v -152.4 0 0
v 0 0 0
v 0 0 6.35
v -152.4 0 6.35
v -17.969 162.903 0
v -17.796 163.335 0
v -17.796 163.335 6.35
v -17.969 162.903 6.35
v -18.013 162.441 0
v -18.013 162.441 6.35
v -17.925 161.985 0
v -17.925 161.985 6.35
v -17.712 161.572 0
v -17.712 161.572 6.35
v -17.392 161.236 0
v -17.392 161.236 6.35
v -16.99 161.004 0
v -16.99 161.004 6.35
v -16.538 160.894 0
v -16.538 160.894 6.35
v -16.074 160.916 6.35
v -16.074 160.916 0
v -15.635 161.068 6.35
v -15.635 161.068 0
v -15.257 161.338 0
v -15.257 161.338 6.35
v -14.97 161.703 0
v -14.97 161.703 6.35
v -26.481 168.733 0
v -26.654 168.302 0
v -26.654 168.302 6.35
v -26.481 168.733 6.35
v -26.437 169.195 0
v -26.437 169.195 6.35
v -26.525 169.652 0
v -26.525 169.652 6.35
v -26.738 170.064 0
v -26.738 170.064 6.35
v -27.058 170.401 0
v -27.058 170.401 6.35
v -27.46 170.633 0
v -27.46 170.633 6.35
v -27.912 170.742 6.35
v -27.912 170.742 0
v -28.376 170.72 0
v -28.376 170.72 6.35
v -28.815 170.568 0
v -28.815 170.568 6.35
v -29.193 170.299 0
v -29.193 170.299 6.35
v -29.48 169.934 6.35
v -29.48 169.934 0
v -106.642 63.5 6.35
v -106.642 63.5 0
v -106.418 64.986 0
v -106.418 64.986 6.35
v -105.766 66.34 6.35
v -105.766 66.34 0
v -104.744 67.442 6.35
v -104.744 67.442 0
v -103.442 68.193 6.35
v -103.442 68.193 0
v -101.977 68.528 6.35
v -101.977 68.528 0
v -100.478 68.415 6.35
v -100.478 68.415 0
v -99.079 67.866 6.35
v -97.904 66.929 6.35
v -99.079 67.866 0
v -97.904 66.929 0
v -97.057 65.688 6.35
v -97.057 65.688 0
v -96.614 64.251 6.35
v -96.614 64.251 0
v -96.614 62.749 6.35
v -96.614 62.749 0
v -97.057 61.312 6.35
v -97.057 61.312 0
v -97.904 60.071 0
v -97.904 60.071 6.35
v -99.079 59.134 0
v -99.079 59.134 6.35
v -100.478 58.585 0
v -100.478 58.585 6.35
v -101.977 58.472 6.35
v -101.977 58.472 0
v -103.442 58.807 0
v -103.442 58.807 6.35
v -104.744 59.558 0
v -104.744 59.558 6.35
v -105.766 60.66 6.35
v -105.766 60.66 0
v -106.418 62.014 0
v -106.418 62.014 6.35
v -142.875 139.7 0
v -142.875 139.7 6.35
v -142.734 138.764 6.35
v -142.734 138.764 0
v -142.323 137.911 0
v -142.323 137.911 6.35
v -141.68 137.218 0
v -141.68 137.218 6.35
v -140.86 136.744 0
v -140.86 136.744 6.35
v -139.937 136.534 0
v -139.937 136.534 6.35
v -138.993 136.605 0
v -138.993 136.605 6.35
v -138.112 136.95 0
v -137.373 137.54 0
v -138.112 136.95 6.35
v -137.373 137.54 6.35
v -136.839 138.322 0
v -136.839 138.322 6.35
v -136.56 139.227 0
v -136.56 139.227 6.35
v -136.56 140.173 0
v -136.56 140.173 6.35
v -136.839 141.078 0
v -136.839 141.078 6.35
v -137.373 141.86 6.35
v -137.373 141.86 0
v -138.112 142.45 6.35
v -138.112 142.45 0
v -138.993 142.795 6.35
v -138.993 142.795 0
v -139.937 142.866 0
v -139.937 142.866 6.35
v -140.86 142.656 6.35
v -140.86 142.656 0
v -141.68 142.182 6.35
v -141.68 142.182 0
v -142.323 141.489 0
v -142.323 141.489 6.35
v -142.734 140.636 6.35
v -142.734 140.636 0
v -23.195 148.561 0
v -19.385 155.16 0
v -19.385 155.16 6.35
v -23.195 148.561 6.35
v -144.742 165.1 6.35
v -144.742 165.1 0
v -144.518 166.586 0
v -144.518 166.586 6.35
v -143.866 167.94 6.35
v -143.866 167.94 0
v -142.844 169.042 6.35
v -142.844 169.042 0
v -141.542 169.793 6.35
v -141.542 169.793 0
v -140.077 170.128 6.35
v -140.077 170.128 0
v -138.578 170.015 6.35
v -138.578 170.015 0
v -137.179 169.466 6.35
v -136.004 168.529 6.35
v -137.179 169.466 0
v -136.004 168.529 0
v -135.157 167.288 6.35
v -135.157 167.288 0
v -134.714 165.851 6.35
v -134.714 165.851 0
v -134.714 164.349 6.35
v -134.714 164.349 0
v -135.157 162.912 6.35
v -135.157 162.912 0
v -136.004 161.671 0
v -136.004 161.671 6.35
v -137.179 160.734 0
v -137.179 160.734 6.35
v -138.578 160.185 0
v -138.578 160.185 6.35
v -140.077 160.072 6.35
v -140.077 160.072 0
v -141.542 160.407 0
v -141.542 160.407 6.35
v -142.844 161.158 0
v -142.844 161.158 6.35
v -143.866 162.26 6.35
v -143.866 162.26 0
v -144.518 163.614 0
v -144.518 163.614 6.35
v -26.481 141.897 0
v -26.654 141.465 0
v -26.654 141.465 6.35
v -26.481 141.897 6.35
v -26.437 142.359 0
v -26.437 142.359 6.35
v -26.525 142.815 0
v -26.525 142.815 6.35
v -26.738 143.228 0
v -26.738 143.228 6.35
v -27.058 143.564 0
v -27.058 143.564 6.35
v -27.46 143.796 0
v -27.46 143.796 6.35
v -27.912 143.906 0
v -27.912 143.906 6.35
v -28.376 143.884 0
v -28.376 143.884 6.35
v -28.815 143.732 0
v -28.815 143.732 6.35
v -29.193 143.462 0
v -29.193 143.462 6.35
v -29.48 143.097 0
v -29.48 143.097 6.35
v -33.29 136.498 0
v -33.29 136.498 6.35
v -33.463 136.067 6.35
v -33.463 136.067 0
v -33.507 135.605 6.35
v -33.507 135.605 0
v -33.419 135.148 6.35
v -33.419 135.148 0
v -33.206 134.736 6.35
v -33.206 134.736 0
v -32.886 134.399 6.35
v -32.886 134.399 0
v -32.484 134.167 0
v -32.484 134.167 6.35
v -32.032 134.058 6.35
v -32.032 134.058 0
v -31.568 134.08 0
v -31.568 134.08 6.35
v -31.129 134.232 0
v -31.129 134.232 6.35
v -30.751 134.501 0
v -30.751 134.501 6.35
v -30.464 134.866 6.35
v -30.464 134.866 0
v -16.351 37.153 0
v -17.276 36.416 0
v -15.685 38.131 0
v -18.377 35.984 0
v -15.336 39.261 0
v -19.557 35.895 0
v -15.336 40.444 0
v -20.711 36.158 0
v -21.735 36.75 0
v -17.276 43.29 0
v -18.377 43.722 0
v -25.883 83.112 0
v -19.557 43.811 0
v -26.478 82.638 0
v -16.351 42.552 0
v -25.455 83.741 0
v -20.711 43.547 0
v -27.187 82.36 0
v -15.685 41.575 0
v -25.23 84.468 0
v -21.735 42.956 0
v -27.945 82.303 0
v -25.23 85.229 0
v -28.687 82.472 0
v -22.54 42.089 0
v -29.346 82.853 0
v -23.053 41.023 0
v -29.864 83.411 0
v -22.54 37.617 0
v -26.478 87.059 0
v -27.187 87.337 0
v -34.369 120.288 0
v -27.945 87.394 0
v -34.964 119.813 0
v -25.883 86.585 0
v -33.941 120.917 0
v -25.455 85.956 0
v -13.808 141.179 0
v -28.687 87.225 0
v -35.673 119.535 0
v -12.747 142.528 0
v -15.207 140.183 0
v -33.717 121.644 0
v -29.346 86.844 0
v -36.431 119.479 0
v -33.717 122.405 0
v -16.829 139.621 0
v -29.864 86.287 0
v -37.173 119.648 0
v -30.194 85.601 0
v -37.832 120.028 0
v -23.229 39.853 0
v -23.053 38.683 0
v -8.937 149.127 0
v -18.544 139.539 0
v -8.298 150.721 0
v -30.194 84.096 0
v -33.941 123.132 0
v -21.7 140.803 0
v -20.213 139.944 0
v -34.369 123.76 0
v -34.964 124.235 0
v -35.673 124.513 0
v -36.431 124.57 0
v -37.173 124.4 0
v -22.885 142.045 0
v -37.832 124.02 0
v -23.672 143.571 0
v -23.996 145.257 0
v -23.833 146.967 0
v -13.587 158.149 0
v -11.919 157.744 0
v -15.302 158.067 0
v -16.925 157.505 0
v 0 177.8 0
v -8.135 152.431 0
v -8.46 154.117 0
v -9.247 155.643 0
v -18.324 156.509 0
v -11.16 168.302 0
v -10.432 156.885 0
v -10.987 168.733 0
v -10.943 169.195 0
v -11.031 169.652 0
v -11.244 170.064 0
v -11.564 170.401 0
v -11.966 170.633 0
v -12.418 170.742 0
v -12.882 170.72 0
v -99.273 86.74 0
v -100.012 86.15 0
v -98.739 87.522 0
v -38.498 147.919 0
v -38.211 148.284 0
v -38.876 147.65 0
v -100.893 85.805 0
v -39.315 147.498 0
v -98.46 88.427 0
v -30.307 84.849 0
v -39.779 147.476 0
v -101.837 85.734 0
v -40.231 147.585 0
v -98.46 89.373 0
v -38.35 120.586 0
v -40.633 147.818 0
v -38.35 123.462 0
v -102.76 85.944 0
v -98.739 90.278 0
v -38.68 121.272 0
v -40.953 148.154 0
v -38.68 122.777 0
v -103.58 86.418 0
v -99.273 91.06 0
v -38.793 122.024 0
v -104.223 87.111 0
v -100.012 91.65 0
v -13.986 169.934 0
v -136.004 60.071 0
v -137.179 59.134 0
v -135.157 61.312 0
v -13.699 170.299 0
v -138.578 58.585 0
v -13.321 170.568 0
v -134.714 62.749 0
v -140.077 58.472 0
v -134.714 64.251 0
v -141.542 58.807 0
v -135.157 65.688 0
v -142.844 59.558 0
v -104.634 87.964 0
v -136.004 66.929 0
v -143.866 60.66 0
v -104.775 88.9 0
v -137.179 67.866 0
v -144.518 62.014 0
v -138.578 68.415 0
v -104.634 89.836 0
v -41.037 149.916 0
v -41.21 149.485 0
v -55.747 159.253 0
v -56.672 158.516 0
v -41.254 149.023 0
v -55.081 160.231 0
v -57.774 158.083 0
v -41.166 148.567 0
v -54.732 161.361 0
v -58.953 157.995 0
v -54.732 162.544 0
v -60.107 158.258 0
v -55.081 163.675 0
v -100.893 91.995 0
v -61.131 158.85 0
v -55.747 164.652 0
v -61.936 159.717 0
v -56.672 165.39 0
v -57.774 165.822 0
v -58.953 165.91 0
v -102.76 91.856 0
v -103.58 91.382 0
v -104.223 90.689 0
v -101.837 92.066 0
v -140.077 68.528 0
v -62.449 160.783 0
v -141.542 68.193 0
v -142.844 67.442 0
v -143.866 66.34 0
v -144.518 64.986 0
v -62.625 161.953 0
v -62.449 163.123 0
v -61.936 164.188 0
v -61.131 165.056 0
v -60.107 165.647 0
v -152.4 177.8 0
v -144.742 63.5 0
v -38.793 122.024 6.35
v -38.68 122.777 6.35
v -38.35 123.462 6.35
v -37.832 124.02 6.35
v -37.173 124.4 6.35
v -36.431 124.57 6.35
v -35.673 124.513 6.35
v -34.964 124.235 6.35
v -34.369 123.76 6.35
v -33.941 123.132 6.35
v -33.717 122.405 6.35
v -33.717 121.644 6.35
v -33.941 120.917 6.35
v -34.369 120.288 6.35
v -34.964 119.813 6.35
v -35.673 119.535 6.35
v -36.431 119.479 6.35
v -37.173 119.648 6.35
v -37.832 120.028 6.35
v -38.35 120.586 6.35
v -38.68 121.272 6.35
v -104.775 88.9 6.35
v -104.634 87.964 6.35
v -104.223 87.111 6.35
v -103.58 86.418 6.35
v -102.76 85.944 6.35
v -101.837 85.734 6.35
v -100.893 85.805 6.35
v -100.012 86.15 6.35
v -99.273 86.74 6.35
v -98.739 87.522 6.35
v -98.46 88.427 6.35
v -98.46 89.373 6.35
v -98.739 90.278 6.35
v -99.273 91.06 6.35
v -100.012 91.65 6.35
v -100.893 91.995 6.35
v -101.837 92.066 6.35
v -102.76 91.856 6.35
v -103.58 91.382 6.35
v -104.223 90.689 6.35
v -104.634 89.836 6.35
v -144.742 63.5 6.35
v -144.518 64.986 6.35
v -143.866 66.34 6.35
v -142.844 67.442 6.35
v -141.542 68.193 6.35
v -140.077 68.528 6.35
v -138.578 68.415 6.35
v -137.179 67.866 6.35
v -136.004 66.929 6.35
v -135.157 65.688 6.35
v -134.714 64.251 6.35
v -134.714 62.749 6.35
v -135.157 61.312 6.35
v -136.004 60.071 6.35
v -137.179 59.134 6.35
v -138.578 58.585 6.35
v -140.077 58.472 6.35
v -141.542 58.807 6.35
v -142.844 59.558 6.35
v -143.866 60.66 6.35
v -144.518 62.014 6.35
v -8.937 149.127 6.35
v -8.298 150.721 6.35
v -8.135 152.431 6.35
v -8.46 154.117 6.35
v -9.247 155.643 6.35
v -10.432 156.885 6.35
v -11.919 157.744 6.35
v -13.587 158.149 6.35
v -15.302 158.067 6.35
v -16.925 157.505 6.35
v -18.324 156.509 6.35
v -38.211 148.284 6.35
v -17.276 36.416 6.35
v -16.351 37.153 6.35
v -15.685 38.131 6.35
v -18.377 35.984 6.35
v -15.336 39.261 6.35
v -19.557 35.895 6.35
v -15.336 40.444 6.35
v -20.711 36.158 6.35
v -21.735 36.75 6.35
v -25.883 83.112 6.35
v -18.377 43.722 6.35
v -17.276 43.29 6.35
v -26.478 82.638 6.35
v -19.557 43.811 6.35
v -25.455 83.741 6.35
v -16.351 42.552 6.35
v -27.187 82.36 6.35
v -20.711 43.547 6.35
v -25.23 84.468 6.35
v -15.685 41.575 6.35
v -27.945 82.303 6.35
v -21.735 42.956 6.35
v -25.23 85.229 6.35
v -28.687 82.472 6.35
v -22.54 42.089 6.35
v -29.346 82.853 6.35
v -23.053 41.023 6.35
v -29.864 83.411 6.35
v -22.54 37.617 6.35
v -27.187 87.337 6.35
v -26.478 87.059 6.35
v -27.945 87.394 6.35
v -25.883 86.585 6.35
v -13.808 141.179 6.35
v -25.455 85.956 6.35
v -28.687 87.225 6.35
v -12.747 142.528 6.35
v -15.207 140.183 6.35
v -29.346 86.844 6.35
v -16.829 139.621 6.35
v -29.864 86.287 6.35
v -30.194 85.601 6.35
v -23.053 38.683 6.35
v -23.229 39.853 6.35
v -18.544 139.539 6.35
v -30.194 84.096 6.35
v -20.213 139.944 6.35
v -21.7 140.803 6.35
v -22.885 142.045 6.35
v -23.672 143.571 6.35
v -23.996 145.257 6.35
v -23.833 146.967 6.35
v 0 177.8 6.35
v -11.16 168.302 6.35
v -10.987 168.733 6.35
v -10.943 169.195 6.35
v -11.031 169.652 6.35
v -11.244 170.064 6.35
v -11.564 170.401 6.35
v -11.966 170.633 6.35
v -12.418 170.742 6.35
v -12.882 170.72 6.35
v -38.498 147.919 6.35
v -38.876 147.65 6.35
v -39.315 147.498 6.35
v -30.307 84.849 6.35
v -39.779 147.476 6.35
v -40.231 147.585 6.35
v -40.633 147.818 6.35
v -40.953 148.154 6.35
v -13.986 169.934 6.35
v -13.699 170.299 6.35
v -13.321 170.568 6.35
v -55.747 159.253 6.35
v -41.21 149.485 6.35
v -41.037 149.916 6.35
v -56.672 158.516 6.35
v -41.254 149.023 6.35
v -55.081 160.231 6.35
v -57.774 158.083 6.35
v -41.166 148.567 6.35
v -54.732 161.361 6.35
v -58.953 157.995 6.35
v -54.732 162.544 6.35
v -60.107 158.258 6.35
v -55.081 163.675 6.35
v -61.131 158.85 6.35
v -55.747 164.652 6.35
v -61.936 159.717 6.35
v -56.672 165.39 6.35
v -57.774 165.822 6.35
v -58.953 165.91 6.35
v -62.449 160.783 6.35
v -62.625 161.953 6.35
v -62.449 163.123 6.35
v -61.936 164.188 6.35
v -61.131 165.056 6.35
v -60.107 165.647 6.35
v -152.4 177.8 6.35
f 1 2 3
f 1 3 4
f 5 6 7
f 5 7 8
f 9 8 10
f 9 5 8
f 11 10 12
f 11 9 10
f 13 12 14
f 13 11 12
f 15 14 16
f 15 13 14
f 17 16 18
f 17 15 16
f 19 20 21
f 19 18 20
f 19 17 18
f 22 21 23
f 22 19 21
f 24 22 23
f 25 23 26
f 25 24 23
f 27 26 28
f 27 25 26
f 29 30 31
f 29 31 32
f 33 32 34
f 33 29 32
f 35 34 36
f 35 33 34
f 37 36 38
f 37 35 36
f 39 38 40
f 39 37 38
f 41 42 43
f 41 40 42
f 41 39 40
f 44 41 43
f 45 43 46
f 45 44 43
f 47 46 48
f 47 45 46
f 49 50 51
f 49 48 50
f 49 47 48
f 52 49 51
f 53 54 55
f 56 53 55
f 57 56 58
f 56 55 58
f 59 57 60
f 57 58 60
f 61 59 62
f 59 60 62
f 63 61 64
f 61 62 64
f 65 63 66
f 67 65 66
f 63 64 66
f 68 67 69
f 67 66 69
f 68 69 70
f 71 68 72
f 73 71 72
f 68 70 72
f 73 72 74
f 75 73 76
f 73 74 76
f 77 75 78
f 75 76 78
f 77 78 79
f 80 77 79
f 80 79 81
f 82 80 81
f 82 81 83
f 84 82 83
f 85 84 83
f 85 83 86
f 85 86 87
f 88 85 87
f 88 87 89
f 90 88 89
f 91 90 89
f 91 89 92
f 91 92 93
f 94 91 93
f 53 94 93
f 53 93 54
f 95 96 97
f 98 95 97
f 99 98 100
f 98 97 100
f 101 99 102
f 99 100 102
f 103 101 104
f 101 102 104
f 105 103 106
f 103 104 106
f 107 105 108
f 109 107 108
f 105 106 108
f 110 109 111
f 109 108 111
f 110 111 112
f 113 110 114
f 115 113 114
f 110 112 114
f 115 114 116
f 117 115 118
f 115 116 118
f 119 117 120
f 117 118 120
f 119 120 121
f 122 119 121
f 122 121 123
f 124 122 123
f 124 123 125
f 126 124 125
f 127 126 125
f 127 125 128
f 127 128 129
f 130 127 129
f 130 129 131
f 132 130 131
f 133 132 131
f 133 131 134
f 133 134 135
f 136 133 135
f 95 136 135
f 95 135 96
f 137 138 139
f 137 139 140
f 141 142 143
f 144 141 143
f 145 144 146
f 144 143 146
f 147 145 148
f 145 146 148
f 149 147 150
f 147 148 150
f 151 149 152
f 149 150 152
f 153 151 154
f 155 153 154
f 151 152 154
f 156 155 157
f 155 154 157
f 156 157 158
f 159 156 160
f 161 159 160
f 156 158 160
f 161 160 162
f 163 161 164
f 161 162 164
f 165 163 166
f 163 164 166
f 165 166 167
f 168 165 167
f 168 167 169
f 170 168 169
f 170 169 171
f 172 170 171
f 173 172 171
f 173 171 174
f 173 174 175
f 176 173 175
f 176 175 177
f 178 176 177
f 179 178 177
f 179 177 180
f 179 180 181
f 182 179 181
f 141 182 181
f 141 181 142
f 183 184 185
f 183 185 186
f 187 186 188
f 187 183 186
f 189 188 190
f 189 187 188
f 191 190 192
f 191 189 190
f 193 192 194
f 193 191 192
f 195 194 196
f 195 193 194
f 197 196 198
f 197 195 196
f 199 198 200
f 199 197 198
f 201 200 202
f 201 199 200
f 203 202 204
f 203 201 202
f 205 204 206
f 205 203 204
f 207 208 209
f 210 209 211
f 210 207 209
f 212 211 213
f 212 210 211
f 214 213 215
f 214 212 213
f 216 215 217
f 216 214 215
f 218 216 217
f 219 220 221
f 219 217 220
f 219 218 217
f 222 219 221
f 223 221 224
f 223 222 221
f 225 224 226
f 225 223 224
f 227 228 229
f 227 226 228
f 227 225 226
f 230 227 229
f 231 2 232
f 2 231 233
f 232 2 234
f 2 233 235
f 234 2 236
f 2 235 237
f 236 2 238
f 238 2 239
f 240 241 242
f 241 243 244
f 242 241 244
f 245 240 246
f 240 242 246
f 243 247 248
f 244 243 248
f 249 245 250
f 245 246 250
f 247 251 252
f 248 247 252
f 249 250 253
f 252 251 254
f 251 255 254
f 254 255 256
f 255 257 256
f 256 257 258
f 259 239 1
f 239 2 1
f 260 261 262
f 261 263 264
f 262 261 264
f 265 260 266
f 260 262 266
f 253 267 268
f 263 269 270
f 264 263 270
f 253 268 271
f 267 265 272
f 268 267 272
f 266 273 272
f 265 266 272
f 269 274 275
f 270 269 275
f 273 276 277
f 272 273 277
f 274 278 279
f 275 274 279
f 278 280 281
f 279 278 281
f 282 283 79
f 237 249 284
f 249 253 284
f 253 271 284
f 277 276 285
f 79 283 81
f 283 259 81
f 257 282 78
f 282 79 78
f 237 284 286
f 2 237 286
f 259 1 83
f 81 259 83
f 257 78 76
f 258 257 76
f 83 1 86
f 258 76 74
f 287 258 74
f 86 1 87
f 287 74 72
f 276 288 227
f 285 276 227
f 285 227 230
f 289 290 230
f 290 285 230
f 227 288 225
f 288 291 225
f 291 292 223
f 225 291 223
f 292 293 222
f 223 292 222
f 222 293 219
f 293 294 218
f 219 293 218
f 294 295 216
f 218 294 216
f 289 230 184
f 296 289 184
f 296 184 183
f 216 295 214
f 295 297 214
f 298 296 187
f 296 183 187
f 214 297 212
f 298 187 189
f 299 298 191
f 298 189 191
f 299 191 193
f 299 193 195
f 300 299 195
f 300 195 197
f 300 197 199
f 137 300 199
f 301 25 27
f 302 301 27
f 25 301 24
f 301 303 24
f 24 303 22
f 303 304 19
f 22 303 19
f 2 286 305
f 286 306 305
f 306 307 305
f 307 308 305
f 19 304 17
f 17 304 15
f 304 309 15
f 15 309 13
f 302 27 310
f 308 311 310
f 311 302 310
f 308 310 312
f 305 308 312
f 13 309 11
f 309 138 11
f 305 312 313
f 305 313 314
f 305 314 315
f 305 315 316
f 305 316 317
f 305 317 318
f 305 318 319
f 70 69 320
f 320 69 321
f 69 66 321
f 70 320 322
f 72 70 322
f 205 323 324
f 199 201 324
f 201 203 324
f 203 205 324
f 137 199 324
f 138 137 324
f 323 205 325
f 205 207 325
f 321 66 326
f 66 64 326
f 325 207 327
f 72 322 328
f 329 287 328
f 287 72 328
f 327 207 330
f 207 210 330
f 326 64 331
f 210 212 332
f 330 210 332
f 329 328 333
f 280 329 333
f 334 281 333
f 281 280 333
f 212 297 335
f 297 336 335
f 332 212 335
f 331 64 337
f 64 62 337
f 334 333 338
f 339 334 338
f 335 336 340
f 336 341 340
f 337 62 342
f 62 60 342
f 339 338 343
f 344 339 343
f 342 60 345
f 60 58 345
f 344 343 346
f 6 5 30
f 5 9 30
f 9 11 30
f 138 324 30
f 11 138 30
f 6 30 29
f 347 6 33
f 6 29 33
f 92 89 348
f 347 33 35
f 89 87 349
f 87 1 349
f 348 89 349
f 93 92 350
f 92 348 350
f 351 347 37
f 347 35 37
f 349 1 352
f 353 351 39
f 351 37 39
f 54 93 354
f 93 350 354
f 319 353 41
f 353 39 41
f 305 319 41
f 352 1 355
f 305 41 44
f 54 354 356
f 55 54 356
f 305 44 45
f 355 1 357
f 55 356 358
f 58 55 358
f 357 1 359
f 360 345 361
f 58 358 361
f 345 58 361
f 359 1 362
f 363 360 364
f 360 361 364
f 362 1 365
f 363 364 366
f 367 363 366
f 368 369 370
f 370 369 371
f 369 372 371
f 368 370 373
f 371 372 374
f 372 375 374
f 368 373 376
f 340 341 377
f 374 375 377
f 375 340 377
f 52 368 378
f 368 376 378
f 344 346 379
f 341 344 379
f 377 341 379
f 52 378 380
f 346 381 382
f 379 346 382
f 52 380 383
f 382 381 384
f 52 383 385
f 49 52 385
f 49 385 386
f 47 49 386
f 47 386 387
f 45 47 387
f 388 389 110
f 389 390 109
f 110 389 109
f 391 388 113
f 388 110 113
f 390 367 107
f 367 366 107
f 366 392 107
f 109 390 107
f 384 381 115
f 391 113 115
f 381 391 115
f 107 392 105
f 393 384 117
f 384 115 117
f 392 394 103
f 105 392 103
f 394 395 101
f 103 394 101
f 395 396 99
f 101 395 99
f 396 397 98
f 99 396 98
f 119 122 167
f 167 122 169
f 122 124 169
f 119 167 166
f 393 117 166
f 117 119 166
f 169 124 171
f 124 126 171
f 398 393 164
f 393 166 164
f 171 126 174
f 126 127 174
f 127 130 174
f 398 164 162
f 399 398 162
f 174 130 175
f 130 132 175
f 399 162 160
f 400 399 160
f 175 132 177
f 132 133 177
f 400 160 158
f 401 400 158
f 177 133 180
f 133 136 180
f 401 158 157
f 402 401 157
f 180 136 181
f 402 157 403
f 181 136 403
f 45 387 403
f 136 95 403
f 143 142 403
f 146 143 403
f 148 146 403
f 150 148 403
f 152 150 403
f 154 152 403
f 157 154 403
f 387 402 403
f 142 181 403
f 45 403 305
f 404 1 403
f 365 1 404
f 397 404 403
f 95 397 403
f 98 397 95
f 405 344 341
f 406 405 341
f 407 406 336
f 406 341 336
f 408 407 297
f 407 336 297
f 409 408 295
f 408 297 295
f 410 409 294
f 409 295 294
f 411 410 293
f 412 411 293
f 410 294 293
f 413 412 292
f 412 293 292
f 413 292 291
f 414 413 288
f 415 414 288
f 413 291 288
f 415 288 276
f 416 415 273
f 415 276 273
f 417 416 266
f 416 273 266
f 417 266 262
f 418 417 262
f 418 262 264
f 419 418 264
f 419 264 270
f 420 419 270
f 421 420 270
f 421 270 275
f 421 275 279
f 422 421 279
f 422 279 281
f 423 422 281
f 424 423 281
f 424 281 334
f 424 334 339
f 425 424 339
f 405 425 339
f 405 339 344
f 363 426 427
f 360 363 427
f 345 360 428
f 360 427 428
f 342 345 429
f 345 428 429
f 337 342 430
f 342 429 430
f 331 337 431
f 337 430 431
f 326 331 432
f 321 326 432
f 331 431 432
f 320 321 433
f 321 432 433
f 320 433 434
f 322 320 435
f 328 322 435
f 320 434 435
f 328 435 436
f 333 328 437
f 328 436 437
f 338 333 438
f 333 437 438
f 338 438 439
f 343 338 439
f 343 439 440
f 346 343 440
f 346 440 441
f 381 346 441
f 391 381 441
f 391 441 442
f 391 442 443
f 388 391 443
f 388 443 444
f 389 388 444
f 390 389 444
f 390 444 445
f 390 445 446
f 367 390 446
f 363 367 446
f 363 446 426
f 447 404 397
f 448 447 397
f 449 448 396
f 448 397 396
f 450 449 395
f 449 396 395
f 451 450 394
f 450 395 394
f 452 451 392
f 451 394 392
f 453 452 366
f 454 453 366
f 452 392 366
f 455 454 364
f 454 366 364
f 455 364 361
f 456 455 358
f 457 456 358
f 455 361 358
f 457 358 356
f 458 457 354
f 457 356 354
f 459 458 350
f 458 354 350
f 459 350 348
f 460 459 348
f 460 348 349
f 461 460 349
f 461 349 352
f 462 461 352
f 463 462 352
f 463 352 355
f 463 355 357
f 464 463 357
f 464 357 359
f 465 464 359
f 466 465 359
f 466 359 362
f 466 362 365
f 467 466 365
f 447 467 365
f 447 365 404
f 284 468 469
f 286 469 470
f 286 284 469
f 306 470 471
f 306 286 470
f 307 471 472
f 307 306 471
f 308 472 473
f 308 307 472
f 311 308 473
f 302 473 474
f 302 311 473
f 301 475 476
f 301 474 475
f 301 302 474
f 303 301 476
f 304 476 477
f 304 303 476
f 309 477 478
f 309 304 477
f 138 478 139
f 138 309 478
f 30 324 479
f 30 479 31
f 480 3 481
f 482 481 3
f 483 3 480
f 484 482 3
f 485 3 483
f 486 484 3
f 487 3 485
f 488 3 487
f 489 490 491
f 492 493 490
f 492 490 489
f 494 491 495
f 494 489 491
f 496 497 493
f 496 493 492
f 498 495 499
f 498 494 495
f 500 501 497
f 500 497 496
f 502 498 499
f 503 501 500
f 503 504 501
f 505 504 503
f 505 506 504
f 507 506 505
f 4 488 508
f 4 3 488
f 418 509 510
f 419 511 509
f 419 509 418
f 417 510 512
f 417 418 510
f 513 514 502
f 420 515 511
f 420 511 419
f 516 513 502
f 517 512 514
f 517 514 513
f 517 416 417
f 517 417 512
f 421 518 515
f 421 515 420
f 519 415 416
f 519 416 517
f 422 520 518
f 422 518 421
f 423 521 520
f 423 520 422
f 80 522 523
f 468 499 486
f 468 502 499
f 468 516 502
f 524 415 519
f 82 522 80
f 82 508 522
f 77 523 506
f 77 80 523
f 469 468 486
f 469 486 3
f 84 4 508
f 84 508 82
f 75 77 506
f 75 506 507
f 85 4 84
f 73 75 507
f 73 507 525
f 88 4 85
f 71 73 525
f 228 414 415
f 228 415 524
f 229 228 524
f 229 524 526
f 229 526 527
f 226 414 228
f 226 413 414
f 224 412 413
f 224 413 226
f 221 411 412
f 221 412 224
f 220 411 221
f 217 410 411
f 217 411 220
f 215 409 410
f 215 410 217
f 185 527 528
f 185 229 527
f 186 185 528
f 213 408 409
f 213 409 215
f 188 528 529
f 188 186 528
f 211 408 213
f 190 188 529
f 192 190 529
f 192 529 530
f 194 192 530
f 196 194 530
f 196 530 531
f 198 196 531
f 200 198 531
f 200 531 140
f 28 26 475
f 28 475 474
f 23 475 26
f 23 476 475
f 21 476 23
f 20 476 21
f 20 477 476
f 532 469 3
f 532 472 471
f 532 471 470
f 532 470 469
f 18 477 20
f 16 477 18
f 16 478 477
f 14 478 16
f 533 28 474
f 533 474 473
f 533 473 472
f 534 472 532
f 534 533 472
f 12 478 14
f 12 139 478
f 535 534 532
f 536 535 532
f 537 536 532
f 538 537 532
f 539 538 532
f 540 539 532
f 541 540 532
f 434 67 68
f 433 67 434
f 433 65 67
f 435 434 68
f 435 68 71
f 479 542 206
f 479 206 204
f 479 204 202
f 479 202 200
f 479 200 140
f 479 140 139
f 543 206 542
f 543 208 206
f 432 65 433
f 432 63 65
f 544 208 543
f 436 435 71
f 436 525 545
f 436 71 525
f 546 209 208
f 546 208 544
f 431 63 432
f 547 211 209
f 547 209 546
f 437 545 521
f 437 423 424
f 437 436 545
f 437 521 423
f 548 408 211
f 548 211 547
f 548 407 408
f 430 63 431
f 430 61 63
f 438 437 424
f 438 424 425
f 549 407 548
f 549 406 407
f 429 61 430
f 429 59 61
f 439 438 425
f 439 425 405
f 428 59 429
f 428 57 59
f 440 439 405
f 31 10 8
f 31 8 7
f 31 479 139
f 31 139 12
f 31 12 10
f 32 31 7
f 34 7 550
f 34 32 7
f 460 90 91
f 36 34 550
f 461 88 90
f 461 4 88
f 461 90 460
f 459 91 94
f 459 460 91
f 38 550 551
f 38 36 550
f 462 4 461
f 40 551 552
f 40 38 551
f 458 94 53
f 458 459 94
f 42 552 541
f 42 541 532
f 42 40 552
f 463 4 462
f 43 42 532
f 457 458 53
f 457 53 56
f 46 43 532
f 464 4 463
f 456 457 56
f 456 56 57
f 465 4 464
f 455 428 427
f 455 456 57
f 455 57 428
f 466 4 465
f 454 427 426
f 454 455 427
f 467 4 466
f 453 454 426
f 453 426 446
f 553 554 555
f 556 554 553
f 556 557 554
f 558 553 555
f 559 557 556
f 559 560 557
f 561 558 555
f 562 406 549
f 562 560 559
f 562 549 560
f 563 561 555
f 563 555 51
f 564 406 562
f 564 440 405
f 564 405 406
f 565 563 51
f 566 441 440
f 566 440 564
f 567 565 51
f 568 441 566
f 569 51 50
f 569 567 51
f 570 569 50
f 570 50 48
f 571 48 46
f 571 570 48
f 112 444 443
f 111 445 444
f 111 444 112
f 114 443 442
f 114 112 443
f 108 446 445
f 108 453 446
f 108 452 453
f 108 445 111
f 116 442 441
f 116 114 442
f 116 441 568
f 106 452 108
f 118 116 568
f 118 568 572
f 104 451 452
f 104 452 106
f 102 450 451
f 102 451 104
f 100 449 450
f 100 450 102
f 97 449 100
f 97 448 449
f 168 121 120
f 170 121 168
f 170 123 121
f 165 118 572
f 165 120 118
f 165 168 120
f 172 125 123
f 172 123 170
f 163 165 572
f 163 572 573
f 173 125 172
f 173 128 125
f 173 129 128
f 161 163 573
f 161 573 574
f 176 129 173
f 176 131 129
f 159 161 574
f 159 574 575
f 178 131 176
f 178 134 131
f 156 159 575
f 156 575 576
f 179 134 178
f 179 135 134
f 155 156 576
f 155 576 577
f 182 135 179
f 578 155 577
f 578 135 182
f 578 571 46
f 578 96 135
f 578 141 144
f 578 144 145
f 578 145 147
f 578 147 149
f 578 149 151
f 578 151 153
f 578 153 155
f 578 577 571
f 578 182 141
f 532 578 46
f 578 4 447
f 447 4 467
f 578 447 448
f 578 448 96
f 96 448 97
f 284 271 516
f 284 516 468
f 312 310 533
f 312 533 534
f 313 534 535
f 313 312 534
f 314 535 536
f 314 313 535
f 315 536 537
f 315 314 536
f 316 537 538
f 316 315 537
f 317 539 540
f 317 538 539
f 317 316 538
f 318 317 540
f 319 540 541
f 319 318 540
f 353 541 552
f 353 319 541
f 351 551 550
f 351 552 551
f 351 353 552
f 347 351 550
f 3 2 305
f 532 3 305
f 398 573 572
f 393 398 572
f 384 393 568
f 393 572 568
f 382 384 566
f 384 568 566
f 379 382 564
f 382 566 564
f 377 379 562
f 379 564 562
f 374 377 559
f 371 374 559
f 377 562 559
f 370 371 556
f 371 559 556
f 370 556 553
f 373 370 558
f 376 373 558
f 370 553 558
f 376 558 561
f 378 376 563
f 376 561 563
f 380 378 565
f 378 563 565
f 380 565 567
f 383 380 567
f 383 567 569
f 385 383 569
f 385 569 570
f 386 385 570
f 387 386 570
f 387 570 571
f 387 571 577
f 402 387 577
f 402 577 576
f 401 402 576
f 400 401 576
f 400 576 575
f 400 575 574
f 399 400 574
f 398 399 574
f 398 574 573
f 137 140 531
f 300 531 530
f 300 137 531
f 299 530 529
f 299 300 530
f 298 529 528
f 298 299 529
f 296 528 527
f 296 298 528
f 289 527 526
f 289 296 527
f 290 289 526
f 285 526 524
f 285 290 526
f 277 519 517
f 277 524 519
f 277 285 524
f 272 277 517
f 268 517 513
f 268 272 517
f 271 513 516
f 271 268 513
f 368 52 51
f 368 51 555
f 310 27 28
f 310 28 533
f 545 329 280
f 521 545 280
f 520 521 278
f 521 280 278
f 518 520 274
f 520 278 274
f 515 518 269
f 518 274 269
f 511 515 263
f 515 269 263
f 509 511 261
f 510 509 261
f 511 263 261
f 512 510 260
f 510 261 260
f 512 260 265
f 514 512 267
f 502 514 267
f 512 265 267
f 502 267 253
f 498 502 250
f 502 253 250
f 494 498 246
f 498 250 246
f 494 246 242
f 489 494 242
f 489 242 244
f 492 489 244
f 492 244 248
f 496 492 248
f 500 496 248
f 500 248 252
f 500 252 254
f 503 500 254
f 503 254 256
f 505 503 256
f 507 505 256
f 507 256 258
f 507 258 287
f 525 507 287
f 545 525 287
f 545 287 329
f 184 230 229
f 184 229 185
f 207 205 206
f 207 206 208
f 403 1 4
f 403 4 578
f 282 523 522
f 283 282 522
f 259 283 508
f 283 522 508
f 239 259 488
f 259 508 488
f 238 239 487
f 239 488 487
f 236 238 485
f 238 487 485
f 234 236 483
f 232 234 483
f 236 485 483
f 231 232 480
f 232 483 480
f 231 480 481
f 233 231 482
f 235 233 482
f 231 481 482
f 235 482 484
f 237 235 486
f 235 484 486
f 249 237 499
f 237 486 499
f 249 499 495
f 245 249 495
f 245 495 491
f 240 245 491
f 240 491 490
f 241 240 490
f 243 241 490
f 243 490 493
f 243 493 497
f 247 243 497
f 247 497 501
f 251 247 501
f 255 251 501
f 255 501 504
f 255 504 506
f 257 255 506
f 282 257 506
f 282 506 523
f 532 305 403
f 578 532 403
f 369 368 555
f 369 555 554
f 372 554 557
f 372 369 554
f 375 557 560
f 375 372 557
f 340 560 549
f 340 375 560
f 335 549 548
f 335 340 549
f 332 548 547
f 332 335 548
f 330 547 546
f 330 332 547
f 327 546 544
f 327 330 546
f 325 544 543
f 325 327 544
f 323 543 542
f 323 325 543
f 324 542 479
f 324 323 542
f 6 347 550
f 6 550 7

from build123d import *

# Parameters (mm, degrees)
SKETCH2_W                   = 177.8
SKETCH2_H                   = 152.4
BOSS_EXTRUDE1_DEPTH         = 6.35
F_3_8_CLEARANCE_HOLE1_D     = 10.0838
TAP_DRILL_FOR_1_4_20_TAP1_D = 5.1054
TAP_DRILL_FOR_3_8_16_TAP3_D = 7.9375
F_1_4_0_25_DIAMETER_HOLE1_D = 6.35
CUT_EXTRUDE2_DEPTH          = 235.26250767
CUT_EXTRUDE3_DEPTH          = 235.26250767


with BuildPart() as part:
    # Sketch2 → Boss-Extrude1 (new body)
    with BuildSketch(Plane(origin=(0, 0, 0), x_dir=(0, 1, 0), z_dir=(0, 0, 1))):
        with Locations((88.9, 76.2)):
            Rectangle(SKETCH2_W, SKETCH2_H)
    extrude(amount=BOSS_EXTRUDE1_DEPTH)

    # 3/8 Clearance Hole1 (through all)
    with Locations(Plane.XY.offset(6.35)):
        with Locations((-101.6, 63.5), (-139.7, 63.5), (-139.7, 165.1)):
            Hole(F_3_8_CLEARANCE_HOLE1_D / 2)

    # Tap Drill for 1/4-20 Tap1 (through all)
    with Locations(Plane.XY.offset(6.35)):
        with Locations((-27.75458, 84.8487), (-36.24072, 122.02414)):
            Hole(TAP_DRILL_FOR_1_4_20_TAP1_D / 2)

    # Tap Drill for 3/8-16 Tap3 (through all)
    with Locations(Plane(origin=(0, 0, 0), x_dir=(1, 0, 0), z_dir=(0, 0, -1))):
        with Locations((-58.656709878, -161.952743754), (-19.260612718, -39.85289442)):
            Hole(TAP_DRILL_FOR_3_8_16_TAP3_D / 2)

    # 1/4 (0.25) Diameter Hole1 (through all)
    with Locations(Plane(origin=(0, 0, 0), x_dir=(1, 0, 0), z_dir=(0, 0, -1))):
        with Locations((-101.6, -88.9), (-139.7, -139.7)):
            Hole(F_1_4_0_25_DIAMETER_HOLE1_D / 2)

    # Sketch22 → Cut-Extrude2 (cut, through all)
    with BuildSketch(Plane(origin=(0, 0, 0), x_dir=(1, 0, 0), z_dir=(0, 0, -1))):
        with BuildLine():
            Line((-29.480310158, -143.097334182), (-33.290310158, -136.498220605))
            ThreePointArc((-33.290310158, -136.498220605), (-32.692975, -134.268935448), (-30.463689842, -134.866270605))
            Line((-30.463689842, -134.866270605), (-26.653689842, -141.465384182))
            ThreePointArc((-26.653689842, -141.465384182), (-27.251025, -143.69466934), (-29.480310158, -143.097334182))
        make_face()
        with BuildLine():
            Line((-29.480310158, -169.933729395), (-41.037310158, -149.916418212))
            ThreePointArc((-41.037310158, -149.916418212), (-40.439975, -147.687133054), (-38.210689842, -148.284468212))
            Line((-38.210689842, -148.284468212), (-26.653689842, -168.301779395))
            ThreePointArc((-26.653689842, -168.301779395), (-27.251025, -170.531064552), (-29.480310158, -169.933729395))
        make_face()
        with BuildLine():
            Line((-13.986310158, -169.933729395), (-17.796310158, -163.334615818))
            ThreePointArc((-17.796310158, -163.334615818), (-17.198975, -161.10533066), (-14.969689842, -161.702665818))
            Line((-14.969689842, -161.702665818), (-11.159689842, -168.301779395))
            ThreePointArc((-11.159689842, -168.301779395), (-11.757025, -170.531064552), (-13.986310158, -169.933729395))
        make_face()
    extrude(amount=-CUT_EXTRUDE2_DEPTH, mode=Mode.SUBTRACT)

    # Sketch20 → Cut-Extrude3 (cut, through all)
    with BuildSketch(Plane(origin=(0, 0, 0), x_dir=(1, 0, 0), z_dir=(0, 0, -1))):
        with BuildLine():
            Line((-19.385125577, -155.159806788), (-23.195125577, -148.560693212))
            ThreePointArc((-23.195125577, -148.560693212), (-20.987077328, -140.320144963), (-12.74652908, -142.528193212))
            Line((-12.74652908, -142.528193212), (-8.93652908, -149.127306788))
            ThreePointArc((-8.93652908, -149.127306788), (-11.144577328, -157.367855037), (-19.385125577, -155.159806788))
        make_face()
    extrude(amount=-CUT_EXTRUDE3_DEPTH, mode=Mode.SUBTRACT)


solid = part.part
